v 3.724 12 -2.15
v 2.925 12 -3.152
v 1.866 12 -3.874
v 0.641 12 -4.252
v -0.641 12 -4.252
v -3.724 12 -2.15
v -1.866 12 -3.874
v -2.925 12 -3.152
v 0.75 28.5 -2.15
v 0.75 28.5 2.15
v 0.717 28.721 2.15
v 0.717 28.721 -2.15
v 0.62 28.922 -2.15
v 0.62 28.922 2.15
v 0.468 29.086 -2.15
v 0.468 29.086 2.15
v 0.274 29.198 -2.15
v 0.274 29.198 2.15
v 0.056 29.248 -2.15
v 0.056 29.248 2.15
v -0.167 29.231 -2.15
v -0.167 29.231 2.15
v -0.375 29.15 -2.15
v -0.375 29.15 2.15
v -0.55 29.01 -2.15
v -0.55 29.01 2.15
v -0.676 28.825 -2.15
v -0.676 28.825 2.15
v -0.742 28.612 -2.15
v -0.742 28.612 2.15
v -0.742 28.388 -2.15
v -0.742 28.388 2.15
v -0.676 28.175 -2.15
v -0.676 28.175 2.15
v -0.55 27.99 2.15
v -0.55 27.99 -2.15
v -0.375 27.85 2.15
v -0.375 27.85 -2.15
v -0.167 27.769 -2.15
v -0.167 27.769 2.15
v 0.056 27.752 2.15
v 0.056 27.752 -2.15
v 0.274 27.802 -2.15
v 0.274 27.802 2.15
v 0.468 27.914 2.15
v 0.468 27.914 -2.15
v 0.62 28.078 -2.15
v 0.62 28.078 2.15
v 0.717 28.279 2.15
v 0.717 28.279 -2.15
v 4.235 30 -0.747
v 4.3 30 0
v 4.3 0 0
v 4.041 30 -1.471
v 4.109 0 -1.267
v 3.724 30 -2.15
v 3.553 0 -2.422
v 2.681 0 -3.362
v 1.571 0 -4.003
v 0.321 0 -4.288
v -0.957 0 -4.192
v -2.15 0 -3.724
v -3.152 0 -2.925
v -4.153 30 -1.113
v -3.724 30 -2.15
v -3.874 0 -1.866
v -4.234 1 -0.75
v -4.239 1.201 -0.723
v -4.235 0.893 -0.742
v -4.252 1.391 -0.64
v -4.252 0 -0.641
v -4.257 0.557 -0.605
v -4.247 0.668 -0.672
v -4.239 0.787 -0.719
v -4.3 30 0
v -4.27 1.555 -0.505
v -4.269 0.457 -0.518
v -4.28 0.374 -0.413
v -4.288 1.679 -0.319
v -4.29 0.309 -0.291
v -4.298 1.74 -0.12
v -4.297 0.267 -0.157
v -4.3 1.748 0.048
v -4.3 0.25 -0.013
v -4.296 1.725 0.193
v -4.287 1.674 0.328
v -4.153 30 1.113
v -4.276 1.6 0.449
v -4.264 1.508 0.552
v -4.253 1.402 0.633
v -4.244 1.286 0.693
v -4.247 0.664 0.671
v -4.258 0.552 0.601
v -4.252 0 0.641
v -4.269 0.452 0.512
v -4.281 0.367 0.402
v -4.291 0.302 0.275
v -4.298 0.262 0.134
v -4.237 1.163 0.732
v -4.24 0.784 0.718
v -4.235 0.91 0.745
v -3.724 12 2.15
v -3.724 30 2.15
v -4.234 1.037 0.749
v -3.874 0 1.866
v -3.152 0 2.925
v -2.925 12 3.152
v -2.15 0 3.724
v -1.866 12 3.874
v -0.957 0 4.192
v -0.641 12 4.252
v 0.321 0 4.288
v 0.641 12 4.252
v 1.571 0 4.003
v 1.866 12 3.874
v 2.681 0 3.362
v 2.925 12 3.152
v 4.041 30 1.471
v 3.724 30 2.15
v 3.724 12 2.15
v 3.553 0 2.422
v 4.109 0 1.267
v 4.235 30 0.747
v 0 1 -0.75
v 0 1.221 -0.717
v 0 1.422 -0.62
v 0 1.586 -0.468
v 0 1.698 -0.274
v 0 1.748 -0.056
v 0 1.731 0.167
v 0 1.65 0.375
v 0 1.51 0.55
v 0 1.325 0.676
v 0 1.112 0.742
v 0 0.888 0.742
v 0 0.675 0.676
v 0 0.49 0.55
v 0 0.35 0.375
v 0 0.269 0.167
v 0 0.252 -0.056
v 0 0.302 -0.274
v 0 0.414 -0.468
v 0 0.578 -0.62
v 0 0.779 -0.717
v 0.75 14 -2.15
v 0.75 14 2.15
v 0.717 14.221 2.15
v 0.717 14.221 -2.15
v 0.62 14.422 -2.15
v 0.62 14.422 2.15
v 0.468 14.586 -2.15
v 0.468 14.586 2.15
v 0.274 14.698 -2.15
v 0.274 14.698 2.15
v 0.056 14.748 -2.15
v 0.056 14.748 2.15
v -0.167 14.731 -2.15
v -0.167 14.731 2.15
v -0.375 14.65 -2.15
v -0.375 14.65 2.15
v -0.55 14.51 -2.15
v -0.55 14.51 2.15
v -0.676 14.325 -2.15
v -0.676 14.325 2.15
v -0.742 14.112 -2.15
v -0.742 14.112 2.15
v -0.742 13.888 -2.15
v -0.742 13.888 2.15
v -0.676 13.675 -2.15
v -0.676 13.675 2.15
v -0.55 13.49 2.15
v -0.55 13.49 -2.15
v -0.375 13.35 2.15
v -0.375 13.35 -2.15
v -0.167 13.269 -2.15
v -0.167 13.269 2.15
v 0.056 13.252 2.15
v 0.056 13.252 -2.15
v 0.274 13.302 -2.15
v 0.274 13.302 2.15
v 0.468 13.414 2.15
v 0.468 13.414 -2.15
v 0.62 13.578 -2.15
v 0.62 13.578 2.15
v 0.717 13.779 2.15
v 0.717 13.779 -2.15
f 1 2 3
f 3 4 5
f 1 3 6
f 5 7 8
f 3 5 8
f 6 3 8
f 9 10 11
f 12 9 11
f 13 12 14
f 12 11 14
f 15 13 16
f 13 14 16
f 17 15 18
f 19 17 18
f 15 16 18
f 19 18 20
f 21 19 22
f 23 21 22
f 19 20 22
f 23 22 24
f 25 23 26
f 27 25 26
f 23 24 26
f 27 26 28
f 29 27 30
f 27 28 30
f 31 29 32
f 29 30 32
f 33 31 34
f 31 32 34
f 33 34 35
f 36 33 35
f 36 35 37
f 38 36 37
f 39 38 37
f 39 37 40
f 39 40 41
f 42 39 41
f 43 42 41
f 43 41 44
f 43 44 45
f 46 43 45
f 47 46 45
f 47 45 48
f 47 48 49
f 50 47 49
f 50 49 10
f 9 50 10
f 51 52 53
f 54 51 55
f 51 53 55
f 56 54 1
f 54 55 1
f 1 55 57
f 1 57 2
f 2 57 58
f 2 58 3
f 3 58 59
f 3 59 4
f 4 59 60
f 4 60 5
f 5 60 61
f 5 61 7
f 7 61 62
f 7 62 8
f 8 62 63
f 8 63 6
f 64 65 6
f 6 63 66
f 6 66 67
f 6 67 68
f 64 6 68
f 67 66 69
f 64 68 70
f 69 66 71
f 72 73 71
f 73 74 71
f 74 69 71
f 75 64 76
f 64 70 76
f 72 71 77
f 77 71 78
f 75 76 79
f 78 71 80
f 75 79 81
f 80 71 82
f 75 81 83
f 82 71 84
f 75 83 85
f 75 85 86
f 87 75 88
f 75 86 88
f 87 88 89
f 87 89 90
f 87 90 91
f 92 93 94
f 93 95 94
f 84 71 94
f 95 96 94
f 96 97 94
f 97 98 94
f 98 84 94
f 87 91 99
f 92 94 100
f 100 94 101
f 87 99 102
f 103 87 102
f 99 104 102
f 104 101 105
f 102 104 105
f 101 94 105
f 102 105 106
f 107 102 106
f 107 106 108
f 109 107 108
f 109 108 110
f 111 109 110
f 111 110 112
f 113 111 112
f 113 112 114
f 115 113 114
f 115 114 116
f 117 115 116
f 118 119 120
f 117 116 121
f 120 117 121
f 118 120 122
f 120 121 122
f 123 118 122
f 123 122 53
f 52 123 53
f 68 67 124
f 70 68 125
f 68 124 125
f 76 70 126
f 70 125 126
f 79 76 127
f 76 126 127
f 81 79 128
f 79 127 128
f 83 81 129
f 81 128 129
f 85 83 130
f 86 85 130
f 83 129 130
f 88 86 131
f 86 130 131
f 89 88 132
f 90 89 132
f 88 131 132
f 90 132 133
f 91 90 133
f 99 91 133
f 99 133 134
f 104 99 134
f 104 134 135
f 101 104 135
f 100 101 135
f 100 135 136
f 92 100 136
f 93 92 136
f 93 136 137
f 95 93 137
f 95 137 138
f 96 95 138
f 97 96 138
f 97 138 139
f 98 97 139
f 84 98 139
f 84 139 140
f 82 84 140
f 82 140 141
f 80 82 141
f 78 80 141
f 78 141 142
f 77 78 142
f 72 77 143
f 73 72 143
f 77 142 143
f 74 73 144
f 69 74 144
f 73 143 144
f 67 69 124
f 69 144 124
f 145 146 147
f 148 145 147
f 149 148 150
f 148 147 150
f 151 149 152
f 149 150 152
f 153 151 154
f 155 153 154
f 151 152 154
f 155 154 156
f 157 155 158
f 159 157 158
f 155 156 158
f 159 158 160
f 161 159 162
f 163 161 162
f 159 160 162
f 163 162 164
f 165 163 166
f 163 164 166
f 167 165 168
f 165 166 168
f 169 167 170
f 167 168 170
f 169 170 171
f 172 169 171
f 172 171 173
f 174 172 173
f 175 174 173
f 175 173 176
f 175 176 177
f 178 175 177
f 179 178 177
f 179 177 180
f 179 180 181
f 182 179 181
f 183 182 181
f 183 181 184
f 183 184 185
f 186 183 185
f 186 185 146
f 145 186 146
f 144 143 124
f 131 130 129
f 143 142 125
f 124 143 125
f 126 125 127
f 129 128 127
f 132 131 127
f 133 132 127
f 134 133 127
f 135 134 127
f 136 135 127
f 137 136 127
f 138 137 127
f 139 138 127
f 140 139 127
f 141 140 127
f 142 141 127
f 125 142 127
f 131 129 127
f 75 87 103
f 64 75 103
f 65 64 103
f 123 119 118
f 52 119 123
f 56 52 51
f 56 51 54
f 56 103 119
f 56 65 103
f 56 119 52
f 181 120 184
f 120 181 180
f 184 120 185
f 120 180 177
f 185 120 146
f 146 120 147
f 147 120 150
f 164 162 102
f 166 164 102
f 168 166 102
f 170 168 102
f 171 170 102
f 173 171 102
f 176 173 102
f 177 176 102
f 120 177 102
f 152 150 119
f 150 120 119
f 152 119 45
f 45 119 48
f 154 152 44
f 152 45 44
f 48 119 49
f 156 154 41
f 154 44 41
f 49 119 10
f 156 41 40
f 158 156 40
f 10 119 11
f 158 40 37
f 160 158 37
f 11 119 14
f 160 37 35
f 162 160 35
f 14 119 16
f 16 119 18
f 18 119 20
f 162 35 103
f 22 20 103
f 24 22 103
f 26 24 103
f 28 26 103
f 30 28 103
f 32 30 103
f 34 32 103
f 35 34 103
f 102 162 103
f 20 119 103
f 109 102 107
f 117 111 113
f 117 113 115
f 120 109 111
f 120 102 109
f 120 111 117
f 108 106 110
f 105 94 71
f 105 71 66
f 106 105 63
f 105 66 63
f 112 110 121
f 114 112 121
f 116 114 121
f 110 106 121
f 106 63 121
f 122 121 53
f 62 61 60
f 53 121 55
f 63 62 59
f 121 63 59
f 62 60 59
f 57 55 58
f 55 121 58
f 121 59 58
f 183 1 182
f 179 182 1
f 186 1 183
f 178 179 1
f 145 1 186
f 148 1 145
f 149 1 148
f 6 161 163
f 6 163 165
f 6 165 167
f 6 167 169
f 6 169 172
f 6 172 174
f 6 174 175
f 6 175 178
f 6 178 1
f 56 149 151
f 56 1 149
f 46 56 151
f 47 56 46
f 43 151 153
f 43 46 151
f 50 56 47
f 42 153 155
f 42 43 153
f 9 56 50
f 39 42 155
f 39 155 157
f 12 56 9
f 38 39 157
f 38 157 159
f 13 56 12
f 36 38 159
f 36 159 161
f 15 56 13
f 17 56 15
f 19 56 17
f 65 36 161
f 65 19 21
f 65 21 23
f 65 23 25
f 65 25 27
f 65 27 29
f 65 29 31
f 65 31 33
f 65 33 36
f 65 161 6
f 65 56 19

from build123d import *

# Parameters (mm, degrees)
SKETCH2_R           = 4.3
BOSS_EXTRUDE2_DEPTH = 30
CUT_EXTRUDE2_DEPTH  = 18
SKETCH6_R           = 0.75
CUT_EXTRUDE3_DEPTH  = 10
SKETCH8_R           = 0.75
CUT_EXTRUDE5_DEPTH  = 5.3
SKETCH9_R           = 0.75
CUT_EXTRUDE6_DEPTH  = 10


with BuildPart() as part:
    # Sketch2 → Boss-Extrude2 (new body)
    with BuildSketch(Plane(origin=(0, 0, 0), x_dir=(1, 0, 0), z_dir=(0, 1, 0))):
        Circle(SKETCH2_R)
    extrude(amount=BOSS_EXTRUDE2_DEPTH)

    # Sketch4 → Cut-Extrude2 (cut)
    with BuildSketch(Plane(origin=(0, 30, 0), x_dir=(1, 0, 0), z_dir=(0, 1, 0))):
        with BuildLine():
            Line((0, 2.15), (-3.723909236, 2.15))
            ThreePointArc((-3.723909236, 2.15), (0, 4.3), (3.723909236, 2.15))
            Line((3.723909236, 2.15), (0, 2.15))
        make_face()
        with BuildLine():
            Line((0, -2.15), (-3.723909236, -2.15))
            ThreePointArc((-3.723909236, -2.15), (0, -4.3), (3.723909236, -2.15))
            Line((3.723909236, -2.15), (0, -2.15))
        make_face()
    extrude(amount=-CUT_EXTRUDE2_DEPTH, mode=Mode.SUBTRACT)

    # Sketch6 → Cut-Extrude3 (cut)
    with BuildSketch(Plane.XY.offset(2.15)):
        with Locations((0, 14)):
            Circle(SKETCH6_R)
    extrude(amount=-CUT_EXTRUDE3_DEPTH, mode=Mode.SUBTRACT)

    # Sketch8 → Cut-Extrude5 (cut, through all)
    with BuildSketch(Plane(origin=(0, 0, 0), x_dir=(0, 0, -1), z_dir=(1, 0, 0))):
        with Locations((0, 1)):
            Circle(SKETCH8_R)
    extrude(amount=-CUT_EXTRUDE5_DEPTH, mode=Mode.SUBTRACT)

    # Sketch9 → Cut-Extrude6 (cut)
    with BuildSketch(Plane.XY.offset(2.15)):
        with Locations((0, 28.5)):
            Circle(SKETCH9_R)
    extrude(amount=-CUT_EXTRUDE6_DEPTH, mode=Mode.SUBTRACT)


solid = part.part
